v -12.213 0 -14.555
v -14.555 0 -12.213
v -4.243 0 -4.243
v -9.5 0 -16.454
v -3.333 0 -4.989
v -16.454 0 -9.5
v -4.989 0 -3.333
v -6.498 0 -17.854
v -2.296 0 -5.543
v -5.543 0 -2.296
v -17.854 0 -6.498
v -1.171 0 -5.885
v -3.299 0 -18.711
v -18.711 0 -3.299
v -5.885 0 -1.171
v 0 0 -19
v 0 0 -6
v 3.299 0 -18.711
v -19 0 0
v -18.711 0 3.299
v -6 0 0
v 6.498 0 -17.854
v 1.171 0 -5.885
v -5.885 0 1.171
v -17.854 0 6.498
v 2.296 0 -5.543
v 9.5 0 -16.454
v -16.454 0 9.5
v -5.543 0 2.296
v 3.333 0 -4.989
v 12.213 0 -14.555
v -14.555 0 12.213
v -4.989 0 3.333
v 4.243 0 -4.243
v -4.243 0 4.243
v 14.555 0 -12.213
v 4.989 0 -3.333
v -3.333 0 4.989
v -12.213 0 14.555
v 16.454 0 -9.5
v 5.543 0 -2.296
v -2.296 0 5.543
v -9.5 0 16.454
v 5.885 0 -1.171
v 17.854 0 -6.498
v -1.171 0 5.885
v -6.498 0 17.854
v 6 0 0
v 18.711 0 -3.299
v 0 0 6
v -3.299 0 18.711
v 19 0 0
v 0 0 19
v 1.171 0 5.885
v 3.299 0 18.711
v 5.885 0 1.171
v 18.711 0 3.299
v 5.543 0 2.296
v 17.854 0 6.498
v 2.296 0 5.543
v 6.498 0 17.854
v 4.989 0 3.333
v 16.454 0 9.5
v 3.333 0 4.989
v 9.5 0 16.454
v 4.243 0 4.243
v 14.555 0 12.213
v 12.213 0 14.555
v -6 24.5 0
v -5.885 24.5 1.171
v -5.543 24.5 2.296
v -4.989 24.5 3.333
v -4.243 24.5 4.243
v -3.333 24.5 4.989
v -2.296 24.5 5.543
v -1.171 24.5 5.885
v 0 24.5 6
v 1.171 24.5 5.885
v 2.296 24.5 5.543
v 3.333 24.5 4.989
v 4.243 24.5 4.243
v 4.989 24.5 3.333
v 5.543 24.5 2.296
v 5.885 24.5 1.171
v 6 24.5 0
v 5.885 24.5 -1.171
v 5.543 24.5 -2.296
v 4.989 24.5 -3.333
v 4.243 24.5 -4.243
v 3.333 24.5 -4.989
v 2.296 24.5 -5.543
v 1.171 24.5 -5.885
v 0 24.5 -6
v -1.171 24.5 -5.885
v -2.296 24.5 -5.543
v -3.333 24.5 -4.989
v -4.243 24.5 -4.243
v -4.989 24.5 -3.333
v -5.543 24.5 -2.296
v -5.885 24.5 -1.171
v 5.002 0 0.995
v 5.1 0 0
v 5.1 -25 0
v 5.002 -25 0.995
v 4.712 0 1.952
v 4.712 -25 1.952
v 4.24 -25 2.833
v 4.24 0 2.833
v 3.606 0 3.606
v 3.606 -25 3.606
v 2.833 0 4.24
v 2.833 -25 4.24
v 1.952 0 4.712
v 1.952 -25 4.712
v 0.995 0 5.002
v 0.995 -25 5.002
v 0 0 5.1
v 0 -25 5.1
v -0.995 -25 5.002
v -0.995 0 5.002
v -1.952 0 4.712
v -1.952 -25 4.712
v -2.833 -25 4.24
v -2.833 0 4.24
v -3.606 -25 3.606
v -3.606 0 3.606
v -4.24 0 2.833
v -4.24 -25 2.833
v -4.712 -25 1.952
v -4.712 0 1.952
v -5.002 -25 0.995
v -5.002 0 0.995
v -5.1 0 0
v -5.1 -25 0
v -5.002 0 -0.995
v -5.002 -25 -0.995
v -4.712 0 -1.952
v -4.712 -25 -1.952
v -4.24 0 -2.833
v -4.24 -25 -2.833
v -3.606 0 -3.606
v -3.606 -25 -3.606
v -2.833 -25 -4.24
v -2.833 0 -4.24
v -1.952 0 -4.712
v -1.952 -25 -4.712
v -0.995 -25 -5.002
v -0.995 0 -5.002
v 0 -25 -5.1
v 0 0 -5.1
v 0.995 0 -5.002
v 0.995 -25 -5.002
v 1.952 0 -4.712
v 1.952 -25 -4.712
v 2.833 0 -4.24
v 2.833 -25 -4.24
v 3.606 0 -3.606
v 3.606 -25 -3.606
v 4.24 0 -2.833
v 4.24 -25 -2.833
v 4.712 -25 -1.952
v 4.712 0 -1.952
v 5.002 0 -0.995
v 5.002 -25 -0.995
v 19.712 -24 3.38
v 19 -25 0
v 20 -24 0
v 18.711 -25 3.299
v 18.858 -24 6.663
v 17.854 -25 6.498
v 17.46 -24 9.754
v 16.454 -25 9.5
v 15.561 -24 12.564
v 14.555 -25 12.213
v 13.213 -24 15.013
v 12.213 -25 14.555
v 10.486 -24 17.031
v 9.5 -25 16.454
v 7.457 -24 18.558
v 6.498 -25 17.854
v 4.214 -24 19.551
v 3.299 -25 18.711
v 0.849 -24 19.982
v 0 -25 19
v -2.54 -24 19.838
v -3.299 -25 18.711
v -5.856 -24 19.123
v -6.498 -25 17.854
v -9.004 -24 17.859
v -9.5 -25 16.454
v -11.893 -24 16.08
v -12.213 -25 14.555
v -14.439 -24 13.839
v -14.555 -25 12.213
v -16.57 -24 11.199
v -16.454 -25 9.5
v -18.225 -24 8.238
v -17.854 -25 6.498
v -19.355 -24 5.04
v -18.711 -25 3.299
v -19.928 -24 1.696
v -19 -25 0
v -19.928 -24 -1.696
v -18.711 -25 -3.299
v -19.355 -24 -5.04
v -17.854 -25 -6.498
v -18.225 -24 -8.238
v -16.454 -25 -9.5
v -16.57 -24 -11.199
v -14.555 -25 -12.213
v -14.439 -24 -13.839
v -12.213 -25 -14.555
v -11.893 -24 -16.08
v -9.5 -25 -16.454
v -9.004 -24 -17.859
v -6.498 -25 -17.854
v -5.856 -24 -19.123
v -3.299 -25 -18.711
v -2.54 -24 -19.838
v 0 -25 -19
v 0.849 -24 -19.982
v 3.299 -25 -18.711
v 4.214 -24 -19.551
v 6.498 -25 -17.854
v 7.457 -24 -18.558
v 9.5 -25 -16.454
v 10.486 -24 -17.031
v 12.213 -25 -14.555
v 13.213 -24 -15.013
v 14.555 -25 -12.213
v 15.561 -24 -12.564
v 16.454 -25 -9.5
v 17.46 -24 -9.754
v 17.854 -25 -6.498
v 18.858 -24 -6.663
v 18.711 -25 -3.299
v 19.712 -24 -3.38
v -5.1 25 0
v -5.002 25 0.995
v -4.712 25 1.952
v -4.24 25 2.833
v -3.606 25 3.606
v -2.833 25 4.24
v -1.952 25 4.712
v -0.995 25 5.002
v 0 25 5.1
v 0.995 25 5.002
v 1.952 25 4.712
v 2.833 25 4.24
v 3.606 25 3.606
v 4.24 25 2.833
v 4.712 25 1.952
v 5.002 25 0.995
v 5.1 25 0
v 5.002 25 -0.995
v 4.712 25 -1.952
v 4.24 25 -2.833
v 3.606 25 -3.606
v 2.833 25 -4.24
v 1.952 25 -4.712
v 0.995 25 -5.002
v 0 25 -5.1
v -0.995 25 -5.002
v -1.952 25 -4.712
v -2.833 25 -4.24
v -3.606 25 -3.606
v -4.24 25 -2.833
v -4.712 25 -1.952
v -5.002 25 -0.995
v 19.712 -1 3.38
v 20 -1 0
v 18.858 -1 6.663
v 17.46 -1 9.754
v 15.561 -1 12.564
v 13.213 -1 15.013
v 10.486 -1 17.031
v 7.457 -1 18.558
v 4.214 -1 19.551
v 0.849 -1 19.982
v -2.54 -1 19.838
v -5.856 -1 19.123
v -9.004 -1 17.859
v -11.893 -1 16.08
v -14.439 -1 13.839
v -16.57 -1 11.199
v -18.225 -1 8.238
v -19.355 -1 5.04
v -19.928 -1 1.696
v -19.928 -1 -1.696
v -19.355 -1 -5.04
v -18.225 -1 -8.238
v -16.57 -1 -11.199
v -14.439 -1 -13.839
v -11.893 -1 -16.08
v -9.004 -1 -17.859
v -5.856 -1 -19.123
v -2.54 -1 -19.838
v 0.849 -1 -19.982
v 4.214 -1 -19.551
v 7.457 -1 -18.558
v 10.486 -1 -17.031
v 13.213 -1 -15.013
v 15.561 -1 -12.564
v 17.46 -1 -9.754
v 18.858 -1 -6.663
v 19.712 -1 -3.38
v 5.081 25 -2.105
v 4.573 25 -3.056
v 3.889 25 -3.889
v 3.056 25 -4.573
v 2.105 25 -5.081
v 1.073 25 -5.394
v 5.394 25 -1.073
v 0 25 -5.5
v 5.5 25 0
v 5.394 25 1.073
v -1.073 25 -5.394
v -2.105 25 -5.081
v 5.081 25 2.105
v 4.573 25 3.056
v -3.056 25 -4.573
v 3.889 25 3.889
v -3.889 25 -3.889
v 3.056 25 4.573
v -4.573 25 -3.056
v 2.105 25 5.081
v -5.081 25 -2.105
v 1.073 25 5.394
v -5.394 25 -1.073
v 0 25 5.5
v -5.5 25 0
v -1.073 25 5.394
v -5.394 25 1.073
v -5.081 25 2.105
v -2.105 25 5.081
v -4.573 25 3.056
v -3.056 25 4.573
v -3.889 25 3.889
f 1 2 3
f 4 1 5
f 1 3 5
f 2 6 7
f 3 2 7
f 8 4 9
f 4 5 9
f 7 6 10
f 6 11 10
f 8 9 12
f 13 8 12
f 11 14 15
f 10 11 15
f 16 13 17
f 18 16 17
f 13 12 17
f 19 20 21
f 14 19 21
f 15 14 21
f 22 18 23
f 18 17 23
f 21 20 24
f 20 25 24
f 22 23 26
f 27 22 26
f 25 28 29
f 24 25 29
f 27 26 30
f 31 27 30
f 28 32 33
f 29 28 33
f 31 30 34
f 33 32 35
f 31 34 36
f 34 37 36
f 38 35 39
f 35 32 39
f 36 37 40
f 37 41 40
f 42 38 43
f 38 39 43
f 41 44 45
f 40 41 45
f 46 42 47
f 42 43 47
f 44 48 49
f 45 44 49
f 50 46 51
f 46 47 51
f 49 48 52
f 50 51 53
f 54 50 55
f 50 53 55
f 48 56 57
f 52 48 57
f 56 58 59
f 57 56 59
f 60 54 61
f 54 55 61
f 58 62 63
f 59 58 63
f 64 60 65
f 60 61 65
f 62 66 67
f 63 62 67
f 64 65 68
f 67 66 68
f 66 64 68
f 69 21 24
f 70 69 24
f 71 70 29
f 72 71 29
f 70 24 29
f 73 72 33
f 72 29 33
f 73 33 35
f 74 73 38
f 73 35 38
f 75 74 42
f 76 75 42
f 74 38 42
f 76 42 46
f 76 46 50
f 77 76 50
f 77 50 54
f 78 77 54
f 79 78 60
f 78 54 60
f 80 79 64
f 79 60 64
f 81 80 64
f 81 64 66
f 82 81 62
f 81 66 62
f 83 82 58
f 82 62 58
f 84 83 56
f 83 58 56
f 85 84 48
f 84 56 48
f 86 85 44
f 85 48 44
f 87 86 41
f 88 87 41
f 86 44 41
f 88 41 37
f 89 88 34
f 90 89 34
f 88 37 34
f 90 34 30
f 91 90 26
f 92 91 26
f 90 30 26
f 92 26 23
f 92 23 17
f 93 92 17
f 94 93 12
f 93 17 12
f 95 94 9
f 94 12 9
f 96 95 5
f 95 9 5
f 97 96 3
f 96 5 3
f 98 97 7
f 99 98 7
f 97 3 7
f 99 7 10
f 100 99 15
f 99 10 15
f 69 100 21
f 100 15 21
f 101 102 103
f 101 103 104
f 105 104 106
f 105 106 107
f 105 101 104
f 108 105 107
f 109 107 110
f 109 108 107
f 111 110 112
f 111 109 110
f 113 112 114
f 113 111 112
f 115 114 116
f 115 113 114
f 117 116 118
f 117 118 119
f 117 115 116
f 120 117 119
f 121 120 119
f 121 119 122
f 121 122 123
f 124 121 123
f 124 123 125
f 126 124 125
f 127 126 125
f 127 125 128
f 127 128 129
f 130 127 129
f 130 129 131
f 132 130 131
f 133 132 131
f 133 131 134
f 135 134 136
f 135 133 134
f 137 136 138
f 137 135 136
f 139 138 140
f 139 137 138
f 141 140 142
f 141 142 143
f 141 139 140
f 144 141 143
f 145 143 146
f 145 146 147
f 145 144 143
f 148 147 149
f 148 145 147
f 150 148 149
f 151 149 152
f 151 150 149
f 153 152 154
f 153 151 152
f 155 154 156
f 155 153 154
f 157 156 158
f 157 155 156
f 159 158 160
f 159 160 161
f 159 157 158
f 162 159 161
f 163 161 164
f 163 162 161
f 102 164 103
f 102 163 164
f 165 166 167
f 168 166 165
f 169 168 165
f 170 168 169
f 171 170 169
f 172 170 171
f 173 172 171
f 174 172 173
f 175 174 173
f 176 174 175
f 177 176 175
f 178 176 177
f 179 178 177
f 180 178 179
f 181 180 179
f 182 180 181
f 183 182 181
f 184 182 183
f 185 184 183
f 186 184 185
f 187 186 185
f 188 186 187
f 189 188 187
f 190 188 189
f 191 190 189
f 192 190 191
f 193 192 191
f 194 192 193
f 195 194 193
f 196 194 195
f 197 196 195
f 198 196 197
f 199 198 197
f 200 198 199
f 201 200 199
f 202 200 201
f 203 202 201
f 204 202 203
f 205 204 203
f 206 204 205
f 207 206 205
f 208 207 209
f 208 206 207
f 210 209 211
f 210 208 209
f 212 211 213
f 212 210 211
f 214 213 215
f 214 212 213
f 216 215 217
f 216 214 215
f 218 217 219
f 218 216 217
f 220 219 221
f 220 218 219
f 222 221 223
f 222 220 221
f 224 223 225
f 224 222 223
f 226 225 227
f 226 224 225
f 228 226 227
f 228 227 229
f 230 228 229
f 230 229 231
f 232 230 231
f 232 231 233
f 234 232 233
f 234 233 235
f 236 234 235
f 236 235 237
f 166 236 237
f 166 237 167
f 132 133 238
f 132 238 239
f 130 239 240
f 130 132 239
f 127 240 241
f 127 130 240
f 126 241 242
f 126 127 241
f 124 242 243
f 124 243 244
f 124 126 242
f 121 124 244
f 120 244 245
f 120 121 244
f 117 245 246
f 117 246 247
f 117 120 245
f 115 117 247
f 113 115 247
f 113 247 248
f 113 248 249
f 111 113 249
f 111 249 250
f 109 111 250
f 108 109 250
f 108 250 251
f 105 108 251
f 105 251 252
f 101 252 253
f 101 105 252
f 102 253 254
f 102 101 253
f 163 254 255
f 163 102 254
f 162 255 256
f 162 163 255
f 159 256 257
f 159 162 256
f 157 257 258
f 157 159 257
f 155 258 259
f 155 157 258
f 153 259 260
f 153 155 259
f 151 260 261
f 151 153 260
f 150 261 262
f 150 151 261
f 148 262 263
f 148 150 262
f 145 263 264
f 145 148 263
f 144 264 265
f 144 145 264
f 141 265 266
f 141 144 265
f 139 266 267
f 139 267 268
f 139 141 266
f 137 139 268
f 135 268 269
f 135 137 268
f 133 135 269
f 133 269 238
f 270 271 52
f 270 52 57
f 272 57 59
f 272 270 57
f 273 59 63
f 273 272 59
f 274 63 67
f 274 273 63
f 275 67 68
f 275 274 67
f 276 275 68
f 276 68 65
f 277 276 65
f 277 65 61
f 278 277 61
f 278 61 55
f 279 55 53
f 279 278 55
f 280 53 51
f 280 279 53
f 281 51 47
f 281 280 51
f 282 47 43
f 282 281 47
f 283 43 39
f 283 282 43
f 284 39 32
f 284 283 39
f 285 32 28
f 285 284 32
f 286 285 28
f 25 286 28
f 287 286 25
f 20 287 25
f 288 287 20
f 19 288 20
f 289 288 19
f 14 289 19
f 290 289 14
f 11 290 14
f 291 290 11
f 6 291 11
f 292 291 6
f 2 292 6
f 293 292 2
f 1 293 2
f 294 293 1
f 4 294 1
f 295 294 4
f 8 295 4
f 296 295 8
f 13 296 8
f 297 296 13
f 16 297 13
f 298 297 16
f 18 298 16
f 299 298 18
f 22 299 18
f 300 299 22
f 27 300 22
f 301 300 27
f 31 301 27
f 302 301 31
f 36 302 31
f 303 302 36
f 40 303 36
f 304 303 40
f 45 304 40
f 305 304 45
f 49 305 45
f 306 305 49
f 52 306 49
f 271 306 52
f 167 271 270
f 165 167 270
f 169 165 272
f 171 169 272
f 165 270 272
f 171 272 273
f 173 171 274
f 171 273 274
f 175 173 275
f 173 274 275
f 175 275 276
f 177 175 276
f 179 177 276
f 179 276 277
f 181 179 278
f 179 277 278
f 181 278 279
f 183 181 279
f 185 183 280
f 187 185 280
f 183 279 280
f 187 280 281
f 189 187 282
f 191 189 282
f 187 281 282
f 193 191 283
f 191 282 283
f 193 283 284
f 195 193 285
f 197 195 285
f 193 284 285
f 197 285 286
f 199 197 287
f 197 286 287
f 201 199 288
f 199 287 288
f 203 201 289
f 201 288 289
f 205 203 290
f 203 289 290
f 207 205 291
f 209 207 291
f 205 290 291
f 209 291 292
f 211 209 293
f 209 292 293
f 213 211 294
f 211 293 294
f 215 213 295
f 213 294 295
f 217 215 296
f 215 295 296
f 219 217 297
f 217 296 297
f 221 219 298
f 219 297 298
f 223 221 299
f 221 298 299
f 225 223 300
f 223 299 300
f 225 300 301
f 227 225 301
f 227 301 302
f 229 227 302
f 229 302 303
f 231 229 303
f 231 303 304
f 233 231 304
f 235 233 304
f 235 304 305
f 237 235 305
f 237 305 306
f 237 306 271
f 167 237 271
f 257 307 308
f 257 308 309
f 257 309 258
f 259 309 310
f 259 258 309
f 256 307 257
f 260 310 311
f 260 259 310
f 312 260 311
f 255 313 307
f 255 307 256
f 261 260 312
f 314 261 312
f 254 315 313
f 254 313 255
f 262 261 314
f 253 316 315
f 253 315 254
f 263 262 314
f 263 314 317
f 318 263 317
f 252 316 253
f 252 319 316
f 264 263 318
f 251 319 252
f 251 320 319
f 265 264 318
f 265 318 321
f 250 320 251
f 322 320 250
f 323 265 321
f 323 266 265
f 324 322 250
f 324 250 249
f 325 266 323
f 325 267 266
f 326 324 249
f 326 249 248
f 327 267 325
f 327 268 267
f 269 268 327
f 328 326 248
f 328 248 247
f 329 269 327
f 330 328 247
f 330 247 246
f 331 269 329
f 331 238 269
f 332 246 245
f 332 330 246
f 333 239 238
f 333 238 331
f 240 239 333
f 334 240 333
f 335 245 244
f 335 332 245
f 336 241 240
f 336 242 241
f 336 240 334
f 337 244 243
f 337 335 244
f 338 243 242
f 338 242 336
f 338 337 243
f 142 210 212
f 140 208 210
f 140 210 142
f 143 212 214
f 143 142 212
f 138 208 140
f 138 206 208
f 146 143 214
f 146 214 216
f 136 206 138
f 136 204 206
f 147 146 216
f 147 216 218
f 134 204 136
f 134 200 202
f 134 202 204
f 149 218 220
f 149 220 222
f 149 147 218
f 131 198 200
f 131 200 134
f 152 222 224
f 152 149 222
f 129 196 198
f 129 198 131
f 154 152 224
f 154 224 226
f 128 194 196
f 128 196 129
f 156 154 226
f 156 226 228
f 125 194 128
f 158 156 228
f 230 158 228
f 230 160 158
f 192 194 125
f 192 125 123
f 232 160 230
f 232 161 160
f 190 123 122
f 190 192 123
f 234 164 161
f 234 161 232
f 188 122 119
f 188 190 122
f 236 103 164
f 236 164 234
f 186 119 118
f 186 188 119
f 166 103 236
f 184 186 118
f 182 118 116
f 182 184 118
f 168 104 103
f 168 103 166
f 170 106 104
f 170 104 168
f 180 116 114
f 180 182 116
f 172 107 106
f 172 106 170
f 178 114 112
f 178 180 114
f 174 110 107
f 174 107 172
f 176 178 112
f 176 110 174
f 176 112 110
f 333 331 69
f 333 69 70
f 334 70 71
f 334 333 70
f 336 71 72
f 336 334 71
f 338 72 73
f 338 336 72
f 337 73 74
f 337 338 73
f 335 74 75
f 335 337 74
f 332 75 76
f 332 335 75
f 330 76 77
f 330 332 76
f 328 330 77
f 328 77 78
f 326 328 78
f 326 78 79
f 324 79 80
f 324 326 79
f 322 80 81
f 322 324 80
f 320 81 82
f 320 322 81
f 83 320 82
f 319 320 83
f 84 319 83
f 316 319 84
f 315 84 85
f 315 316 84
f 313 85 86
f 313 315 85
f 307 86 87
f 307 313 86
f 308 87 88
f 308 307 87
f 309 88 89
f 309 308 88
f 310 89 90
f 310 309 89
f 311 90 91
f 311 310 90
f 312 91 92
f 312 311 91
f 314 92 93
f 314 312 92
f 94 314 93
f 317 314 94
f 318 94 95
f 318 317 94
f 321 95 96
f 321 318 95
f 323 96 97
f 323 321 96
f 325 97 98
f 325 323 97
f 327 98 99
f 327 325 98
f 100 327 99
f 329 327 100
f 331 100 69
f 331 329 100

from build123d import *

# Parameters (mm, degrees)
F0_R     = 20
F0_R_2   = 5.1
F1_DEPTH = 25
F2_R     = 6
F2_R_2   = 5.1
F3_DEPTH = 25
F4_SIZE  = 1
F5_SIZE  = 0.5


with BuildPart() as f1:
    # F0 (on Front) → F1 (new body)
    with BuildSketch(Plane.XZ):
        Circle(F0_R)
        Circle(F0_R_2, mode=Mode.SUBTRACT)
    extrude(amount=F1_DEPTH)

    # F2 (on face) → F3 (join)
    with BuildSketch(Plane(origin=(0, 0, 0), x_dir=(-1, 0, 0), z_dir=(0, 1, 0))):
        Circle(F2_R)
        Circle(F2_R_2, mode=Mode.SUBTRACT)
    extrude(amount=F3_DEPTH)

    # F4
    f4_edges = [f1.edges().sort_by_distance(p)[0] for p in [
        (-20, -25, 0),
        (-20, 0, 0),
    ]]
    chamfer(f4_edges, length=F4_SIZE)

    # F5
    f5_edges = [f1.edges().sort_by_distance(p)[0] for p in [
        (6, 25, 0),
    ]]
    chamfer(f5_edges, length=F5_SIZE)


solid = f1.part
